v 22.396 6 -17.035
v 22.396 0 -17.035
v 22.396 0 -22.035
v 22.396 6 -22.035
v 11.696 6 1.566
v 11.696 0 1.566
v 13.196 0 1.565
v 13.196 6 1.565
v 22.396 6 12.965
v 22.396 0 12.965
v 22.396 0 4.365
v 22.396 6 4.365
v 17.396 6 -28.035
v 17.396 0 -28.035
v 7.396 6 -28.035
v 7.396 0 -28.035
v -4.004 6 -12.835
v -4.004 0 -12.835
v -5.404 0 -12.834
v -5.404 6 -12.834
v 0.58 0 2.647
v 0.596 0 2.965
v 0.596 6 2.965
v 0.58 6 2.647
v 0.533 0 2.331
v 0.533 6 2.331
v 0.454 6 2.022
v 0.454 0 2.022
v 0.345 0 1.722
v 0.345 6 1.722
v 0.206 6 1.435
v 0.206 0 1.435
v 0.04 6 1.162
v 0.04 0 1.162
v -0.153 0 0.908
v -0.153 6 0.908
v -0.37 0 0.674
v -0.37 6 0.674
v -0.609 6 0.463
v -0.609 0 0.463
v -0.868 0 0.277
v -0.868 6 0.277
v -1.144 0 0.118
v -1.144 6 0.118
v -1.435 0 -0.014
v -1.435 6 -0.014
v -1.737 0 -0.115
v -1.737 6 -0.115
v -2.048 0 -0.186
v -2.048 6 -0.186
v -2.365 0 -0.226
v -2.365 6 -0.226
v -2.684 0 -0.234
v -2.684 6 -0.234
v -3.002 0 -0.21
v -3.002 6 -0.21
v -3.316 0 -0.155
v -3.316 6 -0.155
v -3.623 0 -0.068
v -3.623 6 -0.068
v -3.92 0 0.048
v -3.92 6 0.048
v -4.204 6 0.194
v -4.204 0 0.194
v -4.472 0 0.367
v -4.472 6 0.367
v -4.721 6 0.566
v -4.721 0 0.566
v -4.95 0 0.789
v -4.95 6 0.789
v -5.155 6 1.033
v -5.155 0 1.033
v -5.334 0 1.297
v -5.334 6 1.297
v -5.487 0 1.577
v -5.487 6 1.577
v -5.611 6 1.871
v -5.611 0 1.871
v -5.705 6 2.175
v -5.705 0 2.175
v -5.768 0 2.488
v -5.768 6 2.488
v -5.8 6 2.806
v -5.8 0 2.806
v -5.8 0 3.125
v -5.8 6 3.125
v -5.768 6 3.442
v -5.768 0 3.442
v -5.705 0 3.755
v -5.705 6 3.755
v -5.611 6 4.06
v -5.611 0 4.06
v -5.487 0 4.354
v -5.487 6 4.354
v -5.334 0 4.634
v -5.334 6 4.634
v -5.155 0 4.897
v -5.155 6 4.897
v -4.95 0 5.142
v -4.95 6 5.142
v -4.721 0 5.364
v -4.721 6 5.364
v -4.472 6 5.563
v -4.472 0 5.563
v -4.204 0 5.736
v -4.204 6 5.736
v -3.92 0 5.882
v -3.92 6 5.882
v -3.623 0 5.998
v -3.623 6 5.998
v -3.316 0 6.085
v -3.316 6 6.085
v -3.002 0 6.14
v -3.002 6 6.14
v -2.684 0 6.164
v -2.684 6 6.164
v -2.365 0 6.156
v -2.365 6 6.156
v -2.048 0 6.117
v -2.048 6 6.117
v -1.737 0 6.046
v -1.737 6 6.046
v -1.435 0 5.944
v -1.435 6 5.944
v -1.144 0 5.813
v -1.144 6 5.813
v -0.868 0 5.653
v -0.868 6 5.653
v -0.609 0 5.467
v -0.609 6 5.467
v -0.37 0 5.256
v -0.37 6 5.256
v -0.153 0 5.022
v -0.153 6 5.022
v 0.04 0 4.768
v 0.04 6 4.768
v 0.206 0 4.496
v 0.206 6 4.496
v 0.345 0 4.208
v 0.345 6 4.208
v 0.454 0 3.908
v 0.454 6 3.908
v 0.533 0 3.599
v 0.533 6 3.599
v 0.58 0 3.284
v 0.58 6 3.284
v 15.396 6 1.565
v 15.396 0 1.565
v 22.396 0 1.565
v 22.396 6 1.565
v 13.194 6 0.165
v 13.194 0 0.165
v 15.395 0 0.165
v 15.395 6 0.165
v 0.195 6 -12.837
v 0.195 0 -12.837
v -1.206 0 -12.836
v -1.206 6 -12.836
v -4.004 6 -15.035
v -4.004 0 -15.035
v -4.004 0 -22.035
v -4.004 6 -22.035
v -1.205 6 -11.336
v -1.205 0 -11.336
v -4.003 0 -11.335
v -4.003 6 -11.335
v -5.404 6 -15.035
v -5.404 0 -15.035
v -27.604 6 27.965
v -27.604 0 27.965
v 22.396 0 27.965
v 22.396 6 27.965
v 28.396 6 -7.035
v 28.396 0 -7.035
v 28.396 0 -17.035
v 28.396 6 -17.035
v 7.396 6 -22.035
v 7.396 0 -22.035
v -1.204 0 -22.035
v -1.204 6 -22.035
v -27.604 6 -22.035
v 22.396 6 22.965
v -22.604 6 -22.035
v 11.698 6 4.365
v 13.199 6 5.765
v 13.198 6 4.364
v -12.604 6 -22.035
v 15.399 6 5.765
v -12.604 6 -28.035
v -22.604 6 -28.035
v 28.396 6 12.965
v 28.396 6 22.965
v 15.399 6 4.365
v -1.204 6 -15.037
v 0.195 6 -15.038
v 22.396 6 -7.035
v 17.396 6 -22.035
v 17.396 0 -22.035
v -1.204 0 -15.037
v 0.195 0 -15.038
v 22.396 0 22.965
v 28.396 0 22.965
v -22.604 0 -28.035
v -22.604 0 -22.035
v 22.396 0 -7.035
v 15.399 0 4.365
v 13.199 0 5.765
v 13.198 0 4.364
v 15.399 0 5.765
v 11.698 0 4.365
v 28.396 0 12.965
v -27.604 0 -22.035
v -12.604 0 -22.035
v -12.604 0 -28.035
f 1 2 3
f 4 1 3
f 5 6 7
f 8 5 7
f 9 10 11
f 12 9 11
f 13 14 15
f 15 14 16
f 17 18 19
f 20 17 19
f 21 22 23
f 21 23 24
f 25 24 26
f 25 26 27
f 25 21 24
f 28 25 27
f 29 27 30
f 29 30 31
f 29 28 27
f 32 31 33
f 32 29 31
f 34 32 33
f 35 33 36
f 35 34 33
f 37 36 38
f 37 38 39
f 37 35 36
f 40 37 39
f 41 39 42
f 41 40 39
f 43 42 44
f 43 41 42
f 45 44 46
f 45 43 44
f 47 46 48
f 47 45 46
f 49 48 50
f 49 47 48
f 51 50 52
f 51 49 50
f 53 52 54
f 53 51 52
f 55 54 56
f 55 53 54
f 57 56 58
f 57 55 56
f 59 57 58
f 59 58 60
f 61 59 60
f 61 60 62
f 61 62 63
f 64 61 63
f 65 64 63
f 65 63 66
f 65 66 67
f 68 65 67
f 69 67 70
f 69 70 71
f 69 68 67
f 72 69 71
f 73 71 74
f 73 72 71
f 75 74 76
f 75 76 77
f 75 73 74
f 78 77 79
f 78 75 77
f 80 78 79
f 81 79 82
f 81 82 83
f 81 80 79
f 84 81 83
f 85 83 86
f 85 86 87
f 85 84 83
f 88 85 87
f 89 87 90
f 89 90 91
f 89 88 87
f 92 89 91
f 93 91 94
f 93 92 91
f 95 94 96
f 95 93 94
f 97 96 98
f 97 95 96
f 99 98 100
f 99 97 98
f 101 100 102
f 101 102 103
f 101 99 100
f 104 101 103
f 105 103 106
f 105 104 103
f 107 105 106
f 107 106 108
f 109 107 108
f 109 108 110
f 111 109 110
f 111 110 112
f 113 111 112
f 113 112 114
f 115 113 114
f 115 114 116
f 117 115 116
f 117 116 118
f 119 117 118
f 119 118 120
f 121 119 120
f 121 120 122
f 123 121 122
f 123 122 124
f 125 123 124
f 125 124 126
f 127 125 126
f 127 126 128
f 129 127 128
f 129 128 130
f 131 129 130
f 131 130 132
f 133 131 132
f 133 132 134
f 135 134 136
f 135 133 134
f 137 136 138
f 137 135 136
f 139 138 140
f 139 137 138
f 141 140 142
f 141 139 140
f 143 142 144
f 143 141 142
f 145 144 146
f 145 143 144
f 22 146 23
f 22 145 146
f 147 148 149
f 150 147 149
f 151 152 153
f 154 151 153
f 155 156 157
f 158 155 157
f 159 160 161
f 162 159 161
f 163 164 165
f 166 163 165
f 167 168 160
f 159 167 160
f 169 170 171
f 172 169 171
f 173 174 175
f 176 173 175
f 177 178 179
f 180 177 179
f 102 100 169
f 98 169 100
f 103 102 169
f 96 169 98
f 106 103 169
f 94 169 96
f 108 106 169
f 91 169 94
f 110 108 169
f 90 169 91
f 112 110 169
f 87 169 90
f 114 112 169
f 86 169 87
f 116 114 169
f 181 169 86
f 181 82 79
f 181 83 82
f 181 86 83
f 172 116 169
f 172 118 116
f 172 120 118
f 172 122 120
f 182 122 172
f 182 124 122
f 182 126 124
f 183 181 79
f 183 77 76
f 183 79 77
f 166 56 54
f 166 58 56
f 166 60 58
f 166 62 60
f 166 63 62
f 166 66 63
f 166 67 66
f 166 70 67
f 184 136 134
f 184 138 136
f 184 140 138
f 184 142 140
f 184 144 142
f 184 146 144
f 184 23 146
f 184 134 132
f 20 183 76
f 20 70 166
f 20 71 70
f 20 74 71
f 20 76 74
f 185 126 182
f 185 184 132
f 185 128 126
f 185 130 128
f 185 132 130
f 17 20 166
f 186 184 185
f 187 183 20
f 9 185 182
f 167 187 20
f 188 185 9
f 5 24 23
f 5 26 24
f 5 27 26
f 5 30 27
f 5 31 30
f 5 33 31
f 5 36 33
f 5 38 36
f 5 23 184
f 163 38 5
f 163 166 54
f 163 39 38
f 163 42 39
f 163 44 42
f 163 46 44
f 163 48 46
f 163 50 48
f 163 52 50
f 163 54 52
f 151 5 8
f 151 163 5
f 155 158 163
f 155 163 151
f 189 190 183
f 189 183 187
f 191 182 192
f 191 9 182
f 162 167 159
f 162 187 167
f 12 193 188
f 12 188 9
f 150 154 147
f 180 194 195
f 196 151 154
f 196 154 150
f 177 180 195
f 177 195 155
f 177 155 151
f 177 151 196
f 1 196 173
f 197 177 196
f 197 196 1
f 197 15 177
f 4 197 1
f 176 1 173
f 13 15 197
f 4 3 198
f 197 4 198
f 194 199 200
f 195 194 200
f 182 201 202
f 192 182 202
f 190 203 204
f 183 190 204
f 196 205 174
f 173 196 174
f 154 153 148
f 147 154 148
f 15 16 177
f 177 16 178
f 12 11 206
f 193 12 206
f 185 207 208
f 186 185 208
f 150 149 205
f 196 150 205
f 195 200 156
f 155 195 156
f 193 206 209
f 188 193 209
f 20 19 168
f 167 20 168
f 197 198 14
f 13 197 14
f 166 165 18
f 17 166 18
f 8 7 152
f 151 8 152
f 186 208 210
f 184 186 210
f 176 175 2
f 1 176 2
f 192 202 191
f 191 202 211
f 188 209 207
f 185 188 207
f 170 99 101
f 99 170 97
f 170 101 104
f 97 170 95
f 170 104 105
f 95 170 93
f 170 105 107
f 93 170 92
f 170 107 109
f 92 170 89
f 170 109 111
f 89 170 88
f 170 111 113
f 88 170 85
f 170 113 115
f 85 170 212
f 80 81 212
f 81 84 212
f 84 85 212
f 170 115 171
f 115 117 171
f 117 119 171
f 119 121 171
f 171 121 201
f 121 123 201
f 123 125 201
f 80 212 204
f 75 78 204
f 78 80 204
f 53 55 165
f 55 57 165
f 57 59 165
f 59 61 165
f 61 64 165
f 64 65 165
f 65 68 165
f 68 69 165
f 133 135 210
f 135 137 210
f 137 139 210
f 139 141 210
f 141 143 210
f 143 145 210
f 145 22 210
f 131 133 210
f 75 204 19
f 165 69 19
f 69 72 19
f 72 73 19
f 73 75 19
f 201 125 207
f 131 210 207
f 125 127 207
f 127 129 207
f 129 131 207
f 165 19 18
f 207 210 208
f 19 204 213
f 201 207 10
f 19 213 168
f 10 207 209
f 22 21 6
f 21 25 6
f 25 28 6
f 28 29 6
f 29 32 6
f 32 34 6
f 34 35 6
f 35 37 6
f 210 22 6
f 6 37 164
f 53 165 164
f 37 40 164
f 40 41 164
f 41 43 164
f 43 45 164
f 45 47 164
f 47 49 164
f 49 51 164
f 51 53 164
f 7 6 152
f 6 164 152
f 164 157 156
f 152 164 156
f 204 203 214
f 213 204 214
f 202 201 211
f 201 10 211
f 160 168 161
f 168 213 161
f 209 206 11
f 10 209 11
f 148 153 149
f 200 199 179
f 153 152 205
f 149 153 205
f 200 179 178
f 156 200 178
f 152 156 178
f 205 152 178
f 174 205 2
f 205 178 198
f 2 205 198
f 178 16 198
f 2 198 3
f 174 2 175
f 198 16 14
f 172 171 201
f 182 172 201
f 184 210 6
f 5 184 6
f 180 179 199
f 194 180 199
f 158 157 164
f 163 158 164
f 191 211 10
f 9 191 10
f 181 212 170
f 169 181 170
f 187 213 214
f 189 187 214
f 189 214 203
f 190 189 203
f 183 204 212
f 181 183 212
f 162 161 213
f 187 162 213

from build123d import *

# Parameters (mm, degrees)
SKETCH_1_R      = 3.2
EXTRUDE_1_DEPTH = 6


with BuildPart() as part:
    # Эскиз1 → Бобышка-Вытянуть1 (new body)
    with BuildSketch(Plane(origin=(0, 0, 0), x_dir=(1, 0, 0), z_dir=(0, 1, 0))):
        Polygon((-27.603963146, 22.034878671), (-27.603963146, -27.965121329), (22.396036854, -27.965121329), (22.396036854, -22.965121329), (28.396036854, -22.965121329), (28.396036854, -12.965121329), (22.396036854, -12.965121329), (22.396036854, -4.365121329), (15.398535816, -4.365121329), (15.398739919, -5.764951191), (13.198739556, -5.765271964), (13.197678648, -4.364354869), (11.697679078, -4.365490812), (11.695559345, -1.566408326), (13.195558915, -1.565272383), (13.194498791, -0.165391578), (15.395321341, -0.165017325), (15.395559431, -1.565121329), (22.395560638, -1.565121329), (22.395560638, 7.034878671), (28.395560638, 7.034878671), (28.395560638, 17.034878671), (22.396036854, 17.034878671), (22.396036854, 22.034878671), (17.396036854, 22.034878671), (17.396036854, 28.034878671), (7.396036854, 28.034878671), (7.396036854, 22.034618289), (-1.203963146, 22.034810758), (-1.203963146, 15.03730972), (0.194846925, 15.037513675), (0.194793578, 12.837275467), (-1.206123677, 12.836452786), (-1.20524281, 11.336452446), (-4.003305339, 11.334809299), (-4.004186206, 12.834809041), (-5.40406717, 12.833986969), (-5.40406717, 15.034809551), (-4.003963146, 15.034809551), (-4.003963146, 22.034810758), (-12.603963146, 22.034878671), (-12.603963146, 28.034878671), (-22.603963146, 28.034878671), (-22.603963146, 22.034878671), align=None)
        with Locations((-2.603963146, -2.965121329)):
            Circle(SKETCH_1_R, mode=Mode.SUBTRACT)
    extrude(amount=EXTRUDE_1_DEPTH)


solid = part.part
